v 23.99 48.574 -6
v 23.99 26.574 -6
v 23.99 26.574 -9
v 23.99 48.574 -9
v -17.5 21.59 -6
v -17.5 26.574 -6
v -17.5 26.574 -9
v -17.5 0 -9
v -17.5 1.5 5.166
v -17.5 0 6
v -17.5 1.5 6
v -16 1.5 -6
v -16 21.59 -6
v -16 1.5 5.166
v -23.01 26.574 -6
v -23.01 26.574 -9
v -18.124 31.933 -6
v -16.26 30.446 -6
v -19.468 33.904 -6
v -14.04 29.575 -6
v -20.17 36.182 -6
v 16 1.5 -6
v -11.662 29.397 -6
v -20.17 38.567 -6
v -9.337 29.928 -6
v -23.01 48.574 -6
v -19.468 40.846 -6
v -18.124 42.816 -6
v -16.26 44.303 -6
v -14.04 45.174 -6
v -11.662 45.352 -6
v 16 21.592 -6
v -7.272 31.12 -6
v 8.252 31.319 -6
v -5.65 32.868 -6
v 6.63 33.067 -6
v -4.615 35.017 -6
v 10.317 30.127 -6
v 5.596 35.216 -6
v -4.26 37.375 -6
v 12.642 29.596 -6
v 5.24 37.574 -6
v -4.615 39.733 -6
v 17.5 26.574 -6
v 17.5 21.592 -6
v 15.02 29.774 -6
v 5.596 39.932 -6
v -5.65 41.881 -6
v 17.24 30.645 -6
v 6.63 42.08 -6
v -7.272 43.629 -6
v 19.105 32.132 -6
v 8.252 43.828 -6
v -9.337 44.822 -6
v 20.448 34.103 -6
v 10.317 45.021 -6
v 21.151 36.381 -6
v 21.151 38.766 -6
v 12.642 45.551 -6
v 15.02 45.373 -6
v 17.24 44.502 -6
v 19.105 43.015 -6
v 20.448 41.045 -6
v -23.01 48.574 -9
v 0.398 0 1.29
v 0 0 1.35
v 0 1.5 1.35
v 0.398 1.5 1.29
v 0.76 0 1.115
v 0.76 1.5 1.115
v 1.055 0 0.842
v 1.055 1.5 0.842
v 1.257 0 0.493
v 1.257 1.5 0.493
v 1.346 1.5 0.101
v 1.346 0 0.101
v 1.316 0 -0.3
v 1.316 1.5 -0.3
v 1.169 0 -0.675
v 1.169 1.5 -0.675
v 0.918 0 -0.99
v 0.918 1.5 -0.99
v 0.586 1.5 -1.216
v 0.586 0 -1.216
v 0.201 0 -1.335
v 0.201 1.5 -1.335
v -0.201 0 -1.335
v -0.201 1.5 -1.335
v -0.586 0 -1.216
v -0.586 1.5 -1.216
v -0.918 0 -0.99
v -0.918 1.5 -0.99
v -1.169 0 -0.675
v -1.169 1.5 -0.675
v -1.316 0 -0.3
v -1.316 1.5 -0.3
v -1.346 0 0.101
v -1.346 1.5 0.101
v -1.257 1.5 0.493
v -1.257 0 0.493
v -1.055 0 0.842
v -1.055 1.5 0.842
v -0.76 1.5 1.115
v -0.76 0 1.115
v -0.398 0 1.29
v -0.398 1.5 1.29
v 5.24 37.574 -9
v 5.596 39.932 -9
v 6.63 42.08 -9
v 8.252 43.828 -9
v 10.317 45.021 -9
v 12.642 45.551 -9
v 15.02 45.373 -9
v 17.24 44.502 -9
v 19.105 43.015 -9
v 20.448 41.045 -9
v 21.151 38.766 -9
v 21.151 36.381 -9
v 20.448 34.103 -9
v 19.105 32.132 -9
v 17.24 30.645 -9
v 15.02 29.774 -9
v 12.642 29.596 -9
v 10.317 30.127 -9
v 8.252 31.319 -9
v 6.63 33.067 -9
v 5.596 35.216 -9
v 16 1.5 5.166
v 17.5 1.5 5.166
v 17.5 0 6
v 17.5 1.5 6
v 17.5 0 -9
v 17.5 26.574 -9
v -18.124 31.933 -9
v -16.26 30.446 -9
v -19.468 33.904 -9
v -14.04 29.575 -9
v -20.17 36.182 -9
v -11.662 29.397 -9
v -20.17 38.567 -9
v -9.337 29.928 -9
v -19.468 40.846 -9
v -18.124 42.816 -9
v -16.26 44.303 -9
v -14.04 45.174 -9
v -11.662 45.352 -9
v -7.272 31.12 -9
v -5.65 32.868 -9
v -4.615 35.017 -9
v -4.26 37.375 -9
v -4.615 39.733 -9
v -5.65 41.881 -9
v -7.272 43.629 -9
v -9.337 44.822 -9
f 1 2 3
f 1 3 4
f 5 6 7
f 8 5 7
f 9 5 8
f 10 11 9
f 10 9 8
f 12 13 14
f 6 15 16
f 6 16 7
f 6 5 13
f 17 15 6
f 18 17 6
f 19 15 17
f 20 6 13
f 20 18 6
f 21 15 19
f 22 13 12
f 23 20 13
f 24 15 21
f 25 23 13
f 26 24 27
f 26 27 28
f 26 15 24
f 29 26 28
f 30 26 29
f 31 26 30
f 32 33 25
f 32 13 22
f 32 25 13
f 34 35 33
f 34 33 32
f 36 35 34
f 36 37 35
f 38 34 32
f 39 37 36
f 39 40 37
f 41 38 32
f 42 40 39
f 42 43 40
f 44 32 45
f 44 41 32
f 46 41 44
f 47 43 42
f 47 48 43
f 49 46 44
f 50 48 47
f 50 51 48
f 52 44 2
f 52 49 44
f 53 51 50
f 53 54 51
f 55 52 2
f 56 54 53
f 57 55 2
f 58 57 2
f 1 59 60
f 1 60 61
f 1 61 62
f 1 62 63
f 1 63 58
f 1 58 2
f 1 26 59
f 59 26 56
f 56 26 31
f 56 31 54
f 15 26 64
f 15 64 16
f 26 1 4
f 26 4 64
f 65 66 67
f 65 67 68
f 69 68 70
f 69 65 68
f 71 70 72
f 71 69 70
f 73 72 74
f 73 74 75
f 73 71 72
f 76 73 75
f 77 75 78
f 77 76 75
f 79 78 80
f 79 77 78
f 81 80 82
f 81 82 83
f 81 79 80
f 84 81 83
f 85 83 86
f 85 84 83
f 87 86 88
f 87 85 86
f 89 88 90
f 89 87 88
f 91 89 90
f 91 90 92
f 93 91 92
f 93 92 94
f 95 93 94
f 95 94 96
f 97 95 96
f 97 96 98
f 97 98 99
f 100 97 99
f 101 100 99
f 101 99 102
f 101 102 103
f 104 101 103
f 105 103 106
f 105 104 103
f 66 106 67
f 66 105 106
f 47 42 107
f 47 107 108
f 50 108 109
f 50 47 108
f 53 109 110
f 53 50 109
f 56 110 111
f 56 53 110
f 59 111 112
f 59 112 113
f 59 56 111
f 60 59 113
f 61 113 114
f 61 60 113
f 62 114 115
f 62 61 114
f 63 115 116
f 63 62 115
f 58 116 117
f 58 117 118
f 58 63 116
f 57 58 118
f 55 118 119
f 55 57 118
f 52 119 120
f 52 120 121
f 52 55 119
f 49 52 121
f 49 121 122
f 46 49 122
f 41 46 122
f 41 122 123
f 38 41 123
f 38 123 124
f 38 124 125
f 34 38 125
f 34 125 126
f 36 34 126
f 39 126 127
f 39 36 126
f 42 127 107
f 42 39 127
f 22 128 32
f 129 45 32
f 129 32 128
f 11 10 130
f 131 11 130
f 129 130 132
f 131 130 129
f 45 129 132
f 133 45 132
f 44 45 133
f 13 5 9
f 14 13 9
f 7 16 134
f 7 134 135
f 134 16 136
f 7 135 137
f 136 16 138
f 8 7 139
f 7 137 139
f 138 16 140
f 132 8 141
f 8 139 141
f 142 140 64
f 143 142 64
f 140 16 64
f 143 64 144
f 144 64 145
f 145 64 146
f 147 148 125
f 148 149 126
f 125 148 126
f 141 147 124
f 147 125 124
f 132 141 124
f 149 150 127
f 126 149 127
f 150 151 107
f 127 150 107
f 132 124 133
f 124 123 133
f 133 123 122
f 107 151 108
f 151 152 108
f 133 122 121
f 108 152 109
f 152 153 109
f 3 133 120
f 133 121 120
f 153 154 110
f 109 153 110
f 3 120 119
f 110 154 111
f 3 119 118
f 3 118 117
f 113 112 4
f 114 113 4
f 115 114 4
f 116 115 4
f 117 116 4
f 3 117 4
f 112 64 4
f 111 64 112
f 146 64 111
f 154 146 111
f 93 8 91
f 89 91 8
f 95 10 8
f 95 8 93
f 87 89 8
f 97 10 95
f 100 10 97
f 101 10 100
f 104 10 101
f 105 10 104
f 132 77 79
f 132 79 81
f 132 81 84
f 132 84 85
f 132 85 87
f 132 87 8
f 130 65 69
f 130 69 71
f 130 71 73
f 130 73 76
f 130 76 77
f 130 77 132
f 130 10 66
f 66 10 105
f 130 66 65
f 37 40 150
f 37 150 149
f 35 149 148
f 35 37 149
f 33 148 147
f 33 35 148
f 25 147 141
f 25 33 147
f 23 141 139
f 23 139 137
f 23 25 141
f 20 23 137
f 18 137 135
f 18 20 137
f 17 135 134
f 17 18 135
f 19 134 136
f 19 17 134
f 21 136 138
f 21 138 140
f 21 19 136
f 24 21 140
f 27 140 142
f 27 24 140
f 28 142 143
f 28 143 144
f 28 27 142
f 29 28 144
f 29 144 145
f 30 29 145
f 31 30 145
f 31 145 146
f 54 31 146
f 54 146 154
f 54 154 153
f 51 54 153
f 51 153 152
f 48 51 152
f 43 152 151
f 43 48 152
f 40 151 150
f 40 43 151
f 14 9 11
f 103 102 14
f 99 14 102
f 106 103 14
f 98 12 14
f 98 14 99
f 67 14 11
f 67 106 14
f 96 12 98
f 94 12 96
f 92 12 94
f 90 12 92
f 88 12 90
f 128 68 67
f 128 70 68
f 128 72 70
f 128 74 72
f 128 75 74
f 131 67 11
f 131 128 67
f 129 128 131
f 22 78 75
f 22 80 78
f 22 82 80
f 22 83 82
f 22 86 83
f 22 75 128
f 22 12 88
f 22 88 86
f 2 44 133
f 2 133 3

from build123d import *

# Parameters (mm, degrees)
BOSS_EXTRUDE3_DEPTH = 1.5
BOSS_EXTRUDE4_DEPTH = 1.5
SKETCH2_W           = 35
SKETCH2_H           = 12
SKETCH2_R           = 1.35
BOSS_EXTRUDE7_DEPTH = 1.5
SKETCH3_R           = 8
BOSS_EXTRUDE8_DEPTH = 3


with BuildPart() as part:
    # Sketch5 → Boss-Extrude3 (new body)
    with BuildSketch(Plane(origin=(-17.5, 0, 0), x_dir=(0, 1, 0), z_dir=(-1, 0, 0))):
        Polygon((21.59, 6), (0, -6), (0, 6), align=None)
    extrude(amount=-BOSS_EXTRUDE3_DEPTH)



with BuildPart() as body_2:
    # Sketch4 → Boss-Extrude4 (new body)
    with BuildSketch(Plane(origin=(17.5, 0, 0), x_dir=(0, 0, -1), z_dir=(1, 0, 0))):
        Polygon((6, 21.592468158), (-6, 0), (6, 0), align=None)
    extrude(amount=-BOSS_EXTRUDE4_DEPTH)


with BuildPart() as part_1:
    add(part.part)

    add(body_2.part)  # Boss-Extrude7 merges body 2
    # Sketch2 → Boss-Extrude7 (add)
    with BuildSketch(Plane(origin=(0, 0, 0), x_dir=(1, 0, 0), z_dir=(0, 1, 0))):
        Rectangle(SKETCH2_W, SKETCH2_H)
        with Locations(Location((0, 0, 0), (0, 0, 270))):
            Circle(SKETCH2_R, mode=Mode.SUBTRACT)
    extrude(amount=BOSS_EXTRUDE7_DEPTH)

    # Sketch3 → Boss-Extrude8 (add)
    with BuildSketch(Plane(origin=(0, 0, -6), x_dir=(-1, 0, 0), z_dir=(0, 0, -1))):
        Polygon((17.5, 0), (-17.5, 0), (-17.5, 26.57366529), (-23.990187259, 26.57366529), (-23.990187259, 48.57366529), (23.009812741, 48.57366529), (23.009812741, 26.57366529), (17.5, 26.57366529), align=None)
        with Locations((-13.240187259, 37.57366529)):
            Circle(SKETCH3_R, mode=Mode.SUBTRACT)
        with Locations(Location((12.259812741, 37.374598913, 0), (0, 0, 180))):
            Circle(SKETCH3_R, mode=Mode.SUBTRACT)
    extrude(amount=BOSS_EXTRUDE8_DEPTH)


solid = part_1.part
